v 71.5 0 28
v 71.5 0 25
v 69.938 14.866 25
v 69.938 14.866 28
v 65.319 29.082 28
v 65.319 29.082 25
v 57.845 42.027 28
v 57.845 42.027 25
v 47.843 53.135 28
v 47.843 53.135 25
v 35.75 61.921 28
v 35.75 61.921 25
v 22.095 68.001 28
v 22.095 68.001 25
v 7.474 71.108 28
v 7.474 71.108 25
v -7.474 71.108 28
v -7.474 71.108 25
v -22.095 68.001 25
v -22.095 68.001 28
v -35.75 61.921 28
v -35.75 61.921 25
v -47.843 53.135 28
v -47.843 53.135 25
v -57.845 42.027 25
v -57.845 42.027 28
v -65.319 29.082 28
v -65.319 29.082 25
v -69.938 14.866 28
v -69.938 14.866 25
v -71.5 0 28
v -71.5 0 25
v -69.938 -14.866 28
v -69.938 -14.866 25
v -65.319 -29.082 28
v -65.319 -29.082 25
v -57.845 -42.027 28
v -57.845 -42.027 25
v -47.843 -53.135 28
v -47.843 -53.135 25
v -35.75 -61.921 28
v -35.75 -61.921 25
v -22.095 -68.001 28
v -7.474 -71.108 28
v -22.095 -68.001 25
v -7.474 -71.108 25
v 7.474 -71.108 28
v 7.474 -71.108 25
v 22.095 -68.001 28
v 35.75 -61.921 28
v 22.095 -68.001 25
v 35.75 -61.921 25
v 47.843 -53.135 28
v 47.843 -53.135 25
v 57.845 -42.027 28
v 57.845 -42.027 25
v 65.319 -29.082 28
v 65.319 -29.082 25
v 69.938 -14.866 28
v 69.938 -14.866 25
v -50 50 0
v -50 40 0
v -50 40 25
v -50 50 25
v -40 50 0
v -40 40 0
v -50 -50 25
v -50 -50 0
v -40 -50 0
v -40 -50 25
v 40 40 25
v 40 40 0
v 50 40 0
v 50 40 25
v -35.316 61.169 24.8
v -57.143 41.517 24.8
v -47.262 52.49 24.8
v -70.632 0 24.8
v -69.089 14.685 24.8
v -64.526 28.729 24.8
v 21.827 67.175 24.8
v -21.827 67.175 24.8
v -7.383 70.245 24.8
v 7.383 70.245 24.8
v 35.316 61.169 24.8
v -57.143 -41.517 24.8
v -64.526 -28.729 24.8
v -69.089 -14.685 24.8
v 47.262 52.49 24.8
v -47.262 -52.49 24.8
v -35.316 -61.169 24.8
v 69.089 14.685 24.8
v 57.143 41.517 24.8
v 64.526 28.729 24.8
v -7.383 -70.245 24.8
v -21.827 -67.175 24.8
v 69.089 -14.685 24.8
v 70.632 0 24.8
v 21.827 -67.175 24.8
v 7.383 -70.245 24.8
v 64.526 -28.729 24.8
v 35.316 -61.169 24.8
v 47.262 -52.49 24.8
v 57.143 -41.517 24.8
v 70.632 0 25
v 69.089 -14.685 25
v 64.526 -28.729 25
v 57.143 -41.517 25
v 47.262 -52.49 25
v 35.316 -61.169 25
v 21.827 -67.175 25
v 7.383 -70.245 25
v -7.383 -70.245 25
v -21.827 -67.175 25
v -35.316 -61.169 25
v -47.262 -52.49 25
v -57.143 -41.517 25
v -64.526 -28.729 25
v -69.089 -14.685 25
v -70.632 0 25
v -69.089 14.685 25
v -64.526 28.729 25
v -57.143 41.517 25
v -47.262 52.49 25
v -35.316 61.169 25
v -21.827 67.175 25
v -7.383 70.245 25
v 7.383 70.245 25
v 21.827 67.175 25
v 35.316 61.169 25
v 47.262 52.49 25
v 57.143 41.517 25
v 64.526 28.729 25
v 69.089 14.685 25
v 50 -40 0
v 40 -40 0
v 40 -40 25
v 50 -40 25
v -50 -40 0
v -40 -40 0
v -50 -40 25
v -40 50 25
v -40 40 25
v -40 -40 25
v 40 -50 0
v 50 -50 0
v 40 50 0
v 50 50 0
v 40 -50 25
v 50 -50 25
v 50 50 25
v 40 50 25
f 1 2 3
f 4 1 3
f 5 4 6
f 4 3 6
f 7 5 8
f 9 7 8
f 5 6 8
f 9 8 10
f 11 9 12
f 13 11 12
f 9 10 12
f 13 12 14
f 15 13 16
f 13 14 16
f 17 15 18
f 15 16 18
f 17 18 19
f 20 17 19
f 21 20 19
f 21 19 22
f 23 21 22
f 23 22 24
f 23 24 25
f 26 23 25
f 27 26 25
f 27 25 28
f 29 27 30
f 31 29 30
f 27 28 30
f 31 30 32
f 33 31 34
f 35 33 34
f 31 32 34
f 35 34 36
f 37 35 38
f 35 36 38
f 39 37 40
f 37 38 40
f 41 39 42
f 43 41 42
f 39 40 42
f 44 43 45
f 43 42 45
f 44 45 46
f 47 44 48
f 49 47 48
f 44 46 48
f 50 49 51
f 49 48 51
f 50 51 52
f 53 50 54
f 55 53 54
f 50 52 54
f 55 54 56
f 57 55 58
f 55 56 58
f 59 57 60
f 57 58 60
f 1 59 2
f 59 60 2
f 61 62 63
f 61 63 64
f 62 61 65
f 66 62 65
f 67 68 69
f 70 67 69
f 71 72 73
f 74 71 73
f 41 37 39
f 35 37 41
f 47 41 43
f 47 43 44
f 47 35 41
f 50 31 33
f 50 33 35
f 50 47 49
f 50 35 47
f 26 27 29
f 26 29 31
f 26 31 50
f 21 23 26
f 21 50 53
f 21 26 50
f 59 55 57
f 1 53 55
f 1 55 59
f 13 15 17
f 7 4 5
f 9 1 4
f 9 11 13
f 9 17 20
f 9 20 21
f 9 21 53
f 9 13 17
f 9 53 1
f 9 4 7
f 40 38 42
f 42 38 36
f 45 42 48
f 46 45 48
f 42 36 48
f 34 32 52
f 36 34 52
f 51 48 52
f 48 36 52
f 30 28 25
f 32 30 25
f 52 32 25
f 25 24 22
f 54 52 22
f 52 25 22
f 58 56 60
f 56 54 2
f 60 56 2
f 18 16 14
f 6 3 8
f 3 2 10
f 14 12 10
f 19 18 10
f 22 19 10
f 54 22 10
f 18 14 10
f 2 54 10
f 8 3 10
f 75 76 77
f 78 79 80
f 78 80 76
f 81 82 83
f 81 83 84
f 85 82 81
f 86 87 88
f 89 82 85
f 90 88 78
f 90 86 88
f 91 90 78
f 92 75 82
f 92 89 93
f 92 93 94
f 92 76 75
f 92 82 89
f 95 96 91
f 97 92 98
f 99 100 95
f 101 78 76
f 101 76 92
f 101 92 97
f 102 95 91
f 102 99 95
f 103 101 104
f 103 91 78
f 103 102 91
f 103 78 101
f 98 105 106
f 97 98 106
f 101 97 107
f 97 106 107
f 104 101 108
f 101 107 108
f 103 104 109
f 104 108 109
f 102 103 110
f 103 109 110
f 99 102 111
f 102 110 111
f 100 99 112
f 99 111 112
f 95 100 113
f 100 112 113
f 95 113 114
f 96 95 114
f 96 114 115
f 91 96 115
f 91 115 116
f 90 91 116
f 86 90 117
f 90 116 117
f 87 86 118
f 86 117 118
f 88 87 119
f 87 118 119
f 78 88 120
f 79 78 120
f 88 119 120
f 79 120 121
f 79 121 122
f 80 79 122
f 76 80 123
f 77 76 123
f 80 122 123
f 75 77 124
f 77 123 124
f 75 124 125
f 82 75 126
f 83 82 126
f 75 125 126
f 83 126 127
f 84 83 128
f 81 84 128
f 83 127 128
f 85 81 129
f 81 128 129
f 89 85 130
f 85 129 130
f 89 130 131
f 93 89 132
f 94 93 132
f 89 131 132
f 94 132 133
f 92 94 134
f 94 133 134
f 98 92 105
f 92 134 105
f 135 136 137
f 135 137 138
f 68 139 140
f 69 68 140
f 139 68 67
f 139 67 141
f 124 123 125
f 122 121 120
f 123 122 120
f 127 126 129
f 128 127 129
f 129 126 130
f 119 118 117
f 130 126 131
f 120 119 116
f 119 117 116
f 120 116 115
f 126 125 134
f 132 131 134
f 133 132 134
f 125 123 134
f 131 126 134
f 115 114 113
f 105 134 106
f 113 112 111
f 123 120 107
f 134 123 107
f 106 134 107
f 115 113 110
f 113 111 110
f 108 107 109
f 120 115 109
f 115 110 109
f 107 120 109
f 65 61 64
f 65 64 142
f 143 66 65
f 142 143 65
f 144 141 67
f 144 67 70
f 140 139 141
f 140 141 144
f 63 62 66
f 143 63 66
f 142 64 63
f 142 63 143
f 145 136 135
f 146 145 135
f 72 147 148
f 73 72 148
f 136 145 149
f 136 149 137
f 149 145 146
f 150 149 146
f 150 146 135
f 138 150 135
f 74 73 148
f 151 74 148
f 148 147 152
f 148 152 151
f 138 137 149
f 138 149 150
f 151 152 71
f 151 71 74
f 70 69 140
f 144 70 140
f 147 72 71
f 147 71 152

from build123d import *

# Parameters (mm, degrees)
F0_W     = 10
F0_H     = 10
F1_DEPTH = 25
F2_R     = 71.5
F3_DEPTH = 3
F6_R     = 70.6323523745
F7_DEPTH = 0.2


# Not quite as in the source:
# - the program builds the solid bodies; features that only make, move or delete a surface that nothing else refers to are left out


with BuildPart() as f1:
    # F0 (on Top) → F1 (new body)
    with BuildSketch(Plane.XY):
        with Locations((45, -45)):
            Rectangle(F0_W, F0_H)
    extrude(amount=F1_DEPTH)


with BuildPart() as f1b:
    # F0 (on Top) → F1, piece 2 (new body)
    with BuildSketch(Plane.XY):
        with Locations((45, 45)):
            Rectangle(F0_W, F0_H)
    extrude(amount=F1_DEPTH)


with BuildPart() as f1c:
    # F0 (on Top) → F1, piece 3 (new body)
    with BuildSketch(Plane.XY):
        with Locations((-45, -45)):
            Rectangle(F0_W, F0_H)
    extrude(amount=F1_DEPTH)


with BuildPart() as f1d:
    # F0 (on Top) → F1, piece 4 (new body)
    with BuildSketch(Plane.XY):
        with Locations((-45, 45)):
            Rectangle(F0_W, F0_H)
    extrude(amount=F1_DEPTH)


with BuildPart() as f3:
    # F2 (on face) → F3 (new body)
    with BuildSketch(Plane.XY.offset(25)):
        Circle(F2_R)
    extrude(amount=F3_DEPTH)


with BuildPart() as f7:
    # F6 (on face) → F7 (new body)
    with BuildSketch(Plane(origin=(0, 0, 25), x_dir=(1, 0, 0), z_dir=(0, 0, -1))):
        Circle(F6_R)
    extrude(amount=F7_DEPTH)


solid = Compound([f1.part, f1b.part, f1c.part, f1d.part, f3.part, f7.part])
